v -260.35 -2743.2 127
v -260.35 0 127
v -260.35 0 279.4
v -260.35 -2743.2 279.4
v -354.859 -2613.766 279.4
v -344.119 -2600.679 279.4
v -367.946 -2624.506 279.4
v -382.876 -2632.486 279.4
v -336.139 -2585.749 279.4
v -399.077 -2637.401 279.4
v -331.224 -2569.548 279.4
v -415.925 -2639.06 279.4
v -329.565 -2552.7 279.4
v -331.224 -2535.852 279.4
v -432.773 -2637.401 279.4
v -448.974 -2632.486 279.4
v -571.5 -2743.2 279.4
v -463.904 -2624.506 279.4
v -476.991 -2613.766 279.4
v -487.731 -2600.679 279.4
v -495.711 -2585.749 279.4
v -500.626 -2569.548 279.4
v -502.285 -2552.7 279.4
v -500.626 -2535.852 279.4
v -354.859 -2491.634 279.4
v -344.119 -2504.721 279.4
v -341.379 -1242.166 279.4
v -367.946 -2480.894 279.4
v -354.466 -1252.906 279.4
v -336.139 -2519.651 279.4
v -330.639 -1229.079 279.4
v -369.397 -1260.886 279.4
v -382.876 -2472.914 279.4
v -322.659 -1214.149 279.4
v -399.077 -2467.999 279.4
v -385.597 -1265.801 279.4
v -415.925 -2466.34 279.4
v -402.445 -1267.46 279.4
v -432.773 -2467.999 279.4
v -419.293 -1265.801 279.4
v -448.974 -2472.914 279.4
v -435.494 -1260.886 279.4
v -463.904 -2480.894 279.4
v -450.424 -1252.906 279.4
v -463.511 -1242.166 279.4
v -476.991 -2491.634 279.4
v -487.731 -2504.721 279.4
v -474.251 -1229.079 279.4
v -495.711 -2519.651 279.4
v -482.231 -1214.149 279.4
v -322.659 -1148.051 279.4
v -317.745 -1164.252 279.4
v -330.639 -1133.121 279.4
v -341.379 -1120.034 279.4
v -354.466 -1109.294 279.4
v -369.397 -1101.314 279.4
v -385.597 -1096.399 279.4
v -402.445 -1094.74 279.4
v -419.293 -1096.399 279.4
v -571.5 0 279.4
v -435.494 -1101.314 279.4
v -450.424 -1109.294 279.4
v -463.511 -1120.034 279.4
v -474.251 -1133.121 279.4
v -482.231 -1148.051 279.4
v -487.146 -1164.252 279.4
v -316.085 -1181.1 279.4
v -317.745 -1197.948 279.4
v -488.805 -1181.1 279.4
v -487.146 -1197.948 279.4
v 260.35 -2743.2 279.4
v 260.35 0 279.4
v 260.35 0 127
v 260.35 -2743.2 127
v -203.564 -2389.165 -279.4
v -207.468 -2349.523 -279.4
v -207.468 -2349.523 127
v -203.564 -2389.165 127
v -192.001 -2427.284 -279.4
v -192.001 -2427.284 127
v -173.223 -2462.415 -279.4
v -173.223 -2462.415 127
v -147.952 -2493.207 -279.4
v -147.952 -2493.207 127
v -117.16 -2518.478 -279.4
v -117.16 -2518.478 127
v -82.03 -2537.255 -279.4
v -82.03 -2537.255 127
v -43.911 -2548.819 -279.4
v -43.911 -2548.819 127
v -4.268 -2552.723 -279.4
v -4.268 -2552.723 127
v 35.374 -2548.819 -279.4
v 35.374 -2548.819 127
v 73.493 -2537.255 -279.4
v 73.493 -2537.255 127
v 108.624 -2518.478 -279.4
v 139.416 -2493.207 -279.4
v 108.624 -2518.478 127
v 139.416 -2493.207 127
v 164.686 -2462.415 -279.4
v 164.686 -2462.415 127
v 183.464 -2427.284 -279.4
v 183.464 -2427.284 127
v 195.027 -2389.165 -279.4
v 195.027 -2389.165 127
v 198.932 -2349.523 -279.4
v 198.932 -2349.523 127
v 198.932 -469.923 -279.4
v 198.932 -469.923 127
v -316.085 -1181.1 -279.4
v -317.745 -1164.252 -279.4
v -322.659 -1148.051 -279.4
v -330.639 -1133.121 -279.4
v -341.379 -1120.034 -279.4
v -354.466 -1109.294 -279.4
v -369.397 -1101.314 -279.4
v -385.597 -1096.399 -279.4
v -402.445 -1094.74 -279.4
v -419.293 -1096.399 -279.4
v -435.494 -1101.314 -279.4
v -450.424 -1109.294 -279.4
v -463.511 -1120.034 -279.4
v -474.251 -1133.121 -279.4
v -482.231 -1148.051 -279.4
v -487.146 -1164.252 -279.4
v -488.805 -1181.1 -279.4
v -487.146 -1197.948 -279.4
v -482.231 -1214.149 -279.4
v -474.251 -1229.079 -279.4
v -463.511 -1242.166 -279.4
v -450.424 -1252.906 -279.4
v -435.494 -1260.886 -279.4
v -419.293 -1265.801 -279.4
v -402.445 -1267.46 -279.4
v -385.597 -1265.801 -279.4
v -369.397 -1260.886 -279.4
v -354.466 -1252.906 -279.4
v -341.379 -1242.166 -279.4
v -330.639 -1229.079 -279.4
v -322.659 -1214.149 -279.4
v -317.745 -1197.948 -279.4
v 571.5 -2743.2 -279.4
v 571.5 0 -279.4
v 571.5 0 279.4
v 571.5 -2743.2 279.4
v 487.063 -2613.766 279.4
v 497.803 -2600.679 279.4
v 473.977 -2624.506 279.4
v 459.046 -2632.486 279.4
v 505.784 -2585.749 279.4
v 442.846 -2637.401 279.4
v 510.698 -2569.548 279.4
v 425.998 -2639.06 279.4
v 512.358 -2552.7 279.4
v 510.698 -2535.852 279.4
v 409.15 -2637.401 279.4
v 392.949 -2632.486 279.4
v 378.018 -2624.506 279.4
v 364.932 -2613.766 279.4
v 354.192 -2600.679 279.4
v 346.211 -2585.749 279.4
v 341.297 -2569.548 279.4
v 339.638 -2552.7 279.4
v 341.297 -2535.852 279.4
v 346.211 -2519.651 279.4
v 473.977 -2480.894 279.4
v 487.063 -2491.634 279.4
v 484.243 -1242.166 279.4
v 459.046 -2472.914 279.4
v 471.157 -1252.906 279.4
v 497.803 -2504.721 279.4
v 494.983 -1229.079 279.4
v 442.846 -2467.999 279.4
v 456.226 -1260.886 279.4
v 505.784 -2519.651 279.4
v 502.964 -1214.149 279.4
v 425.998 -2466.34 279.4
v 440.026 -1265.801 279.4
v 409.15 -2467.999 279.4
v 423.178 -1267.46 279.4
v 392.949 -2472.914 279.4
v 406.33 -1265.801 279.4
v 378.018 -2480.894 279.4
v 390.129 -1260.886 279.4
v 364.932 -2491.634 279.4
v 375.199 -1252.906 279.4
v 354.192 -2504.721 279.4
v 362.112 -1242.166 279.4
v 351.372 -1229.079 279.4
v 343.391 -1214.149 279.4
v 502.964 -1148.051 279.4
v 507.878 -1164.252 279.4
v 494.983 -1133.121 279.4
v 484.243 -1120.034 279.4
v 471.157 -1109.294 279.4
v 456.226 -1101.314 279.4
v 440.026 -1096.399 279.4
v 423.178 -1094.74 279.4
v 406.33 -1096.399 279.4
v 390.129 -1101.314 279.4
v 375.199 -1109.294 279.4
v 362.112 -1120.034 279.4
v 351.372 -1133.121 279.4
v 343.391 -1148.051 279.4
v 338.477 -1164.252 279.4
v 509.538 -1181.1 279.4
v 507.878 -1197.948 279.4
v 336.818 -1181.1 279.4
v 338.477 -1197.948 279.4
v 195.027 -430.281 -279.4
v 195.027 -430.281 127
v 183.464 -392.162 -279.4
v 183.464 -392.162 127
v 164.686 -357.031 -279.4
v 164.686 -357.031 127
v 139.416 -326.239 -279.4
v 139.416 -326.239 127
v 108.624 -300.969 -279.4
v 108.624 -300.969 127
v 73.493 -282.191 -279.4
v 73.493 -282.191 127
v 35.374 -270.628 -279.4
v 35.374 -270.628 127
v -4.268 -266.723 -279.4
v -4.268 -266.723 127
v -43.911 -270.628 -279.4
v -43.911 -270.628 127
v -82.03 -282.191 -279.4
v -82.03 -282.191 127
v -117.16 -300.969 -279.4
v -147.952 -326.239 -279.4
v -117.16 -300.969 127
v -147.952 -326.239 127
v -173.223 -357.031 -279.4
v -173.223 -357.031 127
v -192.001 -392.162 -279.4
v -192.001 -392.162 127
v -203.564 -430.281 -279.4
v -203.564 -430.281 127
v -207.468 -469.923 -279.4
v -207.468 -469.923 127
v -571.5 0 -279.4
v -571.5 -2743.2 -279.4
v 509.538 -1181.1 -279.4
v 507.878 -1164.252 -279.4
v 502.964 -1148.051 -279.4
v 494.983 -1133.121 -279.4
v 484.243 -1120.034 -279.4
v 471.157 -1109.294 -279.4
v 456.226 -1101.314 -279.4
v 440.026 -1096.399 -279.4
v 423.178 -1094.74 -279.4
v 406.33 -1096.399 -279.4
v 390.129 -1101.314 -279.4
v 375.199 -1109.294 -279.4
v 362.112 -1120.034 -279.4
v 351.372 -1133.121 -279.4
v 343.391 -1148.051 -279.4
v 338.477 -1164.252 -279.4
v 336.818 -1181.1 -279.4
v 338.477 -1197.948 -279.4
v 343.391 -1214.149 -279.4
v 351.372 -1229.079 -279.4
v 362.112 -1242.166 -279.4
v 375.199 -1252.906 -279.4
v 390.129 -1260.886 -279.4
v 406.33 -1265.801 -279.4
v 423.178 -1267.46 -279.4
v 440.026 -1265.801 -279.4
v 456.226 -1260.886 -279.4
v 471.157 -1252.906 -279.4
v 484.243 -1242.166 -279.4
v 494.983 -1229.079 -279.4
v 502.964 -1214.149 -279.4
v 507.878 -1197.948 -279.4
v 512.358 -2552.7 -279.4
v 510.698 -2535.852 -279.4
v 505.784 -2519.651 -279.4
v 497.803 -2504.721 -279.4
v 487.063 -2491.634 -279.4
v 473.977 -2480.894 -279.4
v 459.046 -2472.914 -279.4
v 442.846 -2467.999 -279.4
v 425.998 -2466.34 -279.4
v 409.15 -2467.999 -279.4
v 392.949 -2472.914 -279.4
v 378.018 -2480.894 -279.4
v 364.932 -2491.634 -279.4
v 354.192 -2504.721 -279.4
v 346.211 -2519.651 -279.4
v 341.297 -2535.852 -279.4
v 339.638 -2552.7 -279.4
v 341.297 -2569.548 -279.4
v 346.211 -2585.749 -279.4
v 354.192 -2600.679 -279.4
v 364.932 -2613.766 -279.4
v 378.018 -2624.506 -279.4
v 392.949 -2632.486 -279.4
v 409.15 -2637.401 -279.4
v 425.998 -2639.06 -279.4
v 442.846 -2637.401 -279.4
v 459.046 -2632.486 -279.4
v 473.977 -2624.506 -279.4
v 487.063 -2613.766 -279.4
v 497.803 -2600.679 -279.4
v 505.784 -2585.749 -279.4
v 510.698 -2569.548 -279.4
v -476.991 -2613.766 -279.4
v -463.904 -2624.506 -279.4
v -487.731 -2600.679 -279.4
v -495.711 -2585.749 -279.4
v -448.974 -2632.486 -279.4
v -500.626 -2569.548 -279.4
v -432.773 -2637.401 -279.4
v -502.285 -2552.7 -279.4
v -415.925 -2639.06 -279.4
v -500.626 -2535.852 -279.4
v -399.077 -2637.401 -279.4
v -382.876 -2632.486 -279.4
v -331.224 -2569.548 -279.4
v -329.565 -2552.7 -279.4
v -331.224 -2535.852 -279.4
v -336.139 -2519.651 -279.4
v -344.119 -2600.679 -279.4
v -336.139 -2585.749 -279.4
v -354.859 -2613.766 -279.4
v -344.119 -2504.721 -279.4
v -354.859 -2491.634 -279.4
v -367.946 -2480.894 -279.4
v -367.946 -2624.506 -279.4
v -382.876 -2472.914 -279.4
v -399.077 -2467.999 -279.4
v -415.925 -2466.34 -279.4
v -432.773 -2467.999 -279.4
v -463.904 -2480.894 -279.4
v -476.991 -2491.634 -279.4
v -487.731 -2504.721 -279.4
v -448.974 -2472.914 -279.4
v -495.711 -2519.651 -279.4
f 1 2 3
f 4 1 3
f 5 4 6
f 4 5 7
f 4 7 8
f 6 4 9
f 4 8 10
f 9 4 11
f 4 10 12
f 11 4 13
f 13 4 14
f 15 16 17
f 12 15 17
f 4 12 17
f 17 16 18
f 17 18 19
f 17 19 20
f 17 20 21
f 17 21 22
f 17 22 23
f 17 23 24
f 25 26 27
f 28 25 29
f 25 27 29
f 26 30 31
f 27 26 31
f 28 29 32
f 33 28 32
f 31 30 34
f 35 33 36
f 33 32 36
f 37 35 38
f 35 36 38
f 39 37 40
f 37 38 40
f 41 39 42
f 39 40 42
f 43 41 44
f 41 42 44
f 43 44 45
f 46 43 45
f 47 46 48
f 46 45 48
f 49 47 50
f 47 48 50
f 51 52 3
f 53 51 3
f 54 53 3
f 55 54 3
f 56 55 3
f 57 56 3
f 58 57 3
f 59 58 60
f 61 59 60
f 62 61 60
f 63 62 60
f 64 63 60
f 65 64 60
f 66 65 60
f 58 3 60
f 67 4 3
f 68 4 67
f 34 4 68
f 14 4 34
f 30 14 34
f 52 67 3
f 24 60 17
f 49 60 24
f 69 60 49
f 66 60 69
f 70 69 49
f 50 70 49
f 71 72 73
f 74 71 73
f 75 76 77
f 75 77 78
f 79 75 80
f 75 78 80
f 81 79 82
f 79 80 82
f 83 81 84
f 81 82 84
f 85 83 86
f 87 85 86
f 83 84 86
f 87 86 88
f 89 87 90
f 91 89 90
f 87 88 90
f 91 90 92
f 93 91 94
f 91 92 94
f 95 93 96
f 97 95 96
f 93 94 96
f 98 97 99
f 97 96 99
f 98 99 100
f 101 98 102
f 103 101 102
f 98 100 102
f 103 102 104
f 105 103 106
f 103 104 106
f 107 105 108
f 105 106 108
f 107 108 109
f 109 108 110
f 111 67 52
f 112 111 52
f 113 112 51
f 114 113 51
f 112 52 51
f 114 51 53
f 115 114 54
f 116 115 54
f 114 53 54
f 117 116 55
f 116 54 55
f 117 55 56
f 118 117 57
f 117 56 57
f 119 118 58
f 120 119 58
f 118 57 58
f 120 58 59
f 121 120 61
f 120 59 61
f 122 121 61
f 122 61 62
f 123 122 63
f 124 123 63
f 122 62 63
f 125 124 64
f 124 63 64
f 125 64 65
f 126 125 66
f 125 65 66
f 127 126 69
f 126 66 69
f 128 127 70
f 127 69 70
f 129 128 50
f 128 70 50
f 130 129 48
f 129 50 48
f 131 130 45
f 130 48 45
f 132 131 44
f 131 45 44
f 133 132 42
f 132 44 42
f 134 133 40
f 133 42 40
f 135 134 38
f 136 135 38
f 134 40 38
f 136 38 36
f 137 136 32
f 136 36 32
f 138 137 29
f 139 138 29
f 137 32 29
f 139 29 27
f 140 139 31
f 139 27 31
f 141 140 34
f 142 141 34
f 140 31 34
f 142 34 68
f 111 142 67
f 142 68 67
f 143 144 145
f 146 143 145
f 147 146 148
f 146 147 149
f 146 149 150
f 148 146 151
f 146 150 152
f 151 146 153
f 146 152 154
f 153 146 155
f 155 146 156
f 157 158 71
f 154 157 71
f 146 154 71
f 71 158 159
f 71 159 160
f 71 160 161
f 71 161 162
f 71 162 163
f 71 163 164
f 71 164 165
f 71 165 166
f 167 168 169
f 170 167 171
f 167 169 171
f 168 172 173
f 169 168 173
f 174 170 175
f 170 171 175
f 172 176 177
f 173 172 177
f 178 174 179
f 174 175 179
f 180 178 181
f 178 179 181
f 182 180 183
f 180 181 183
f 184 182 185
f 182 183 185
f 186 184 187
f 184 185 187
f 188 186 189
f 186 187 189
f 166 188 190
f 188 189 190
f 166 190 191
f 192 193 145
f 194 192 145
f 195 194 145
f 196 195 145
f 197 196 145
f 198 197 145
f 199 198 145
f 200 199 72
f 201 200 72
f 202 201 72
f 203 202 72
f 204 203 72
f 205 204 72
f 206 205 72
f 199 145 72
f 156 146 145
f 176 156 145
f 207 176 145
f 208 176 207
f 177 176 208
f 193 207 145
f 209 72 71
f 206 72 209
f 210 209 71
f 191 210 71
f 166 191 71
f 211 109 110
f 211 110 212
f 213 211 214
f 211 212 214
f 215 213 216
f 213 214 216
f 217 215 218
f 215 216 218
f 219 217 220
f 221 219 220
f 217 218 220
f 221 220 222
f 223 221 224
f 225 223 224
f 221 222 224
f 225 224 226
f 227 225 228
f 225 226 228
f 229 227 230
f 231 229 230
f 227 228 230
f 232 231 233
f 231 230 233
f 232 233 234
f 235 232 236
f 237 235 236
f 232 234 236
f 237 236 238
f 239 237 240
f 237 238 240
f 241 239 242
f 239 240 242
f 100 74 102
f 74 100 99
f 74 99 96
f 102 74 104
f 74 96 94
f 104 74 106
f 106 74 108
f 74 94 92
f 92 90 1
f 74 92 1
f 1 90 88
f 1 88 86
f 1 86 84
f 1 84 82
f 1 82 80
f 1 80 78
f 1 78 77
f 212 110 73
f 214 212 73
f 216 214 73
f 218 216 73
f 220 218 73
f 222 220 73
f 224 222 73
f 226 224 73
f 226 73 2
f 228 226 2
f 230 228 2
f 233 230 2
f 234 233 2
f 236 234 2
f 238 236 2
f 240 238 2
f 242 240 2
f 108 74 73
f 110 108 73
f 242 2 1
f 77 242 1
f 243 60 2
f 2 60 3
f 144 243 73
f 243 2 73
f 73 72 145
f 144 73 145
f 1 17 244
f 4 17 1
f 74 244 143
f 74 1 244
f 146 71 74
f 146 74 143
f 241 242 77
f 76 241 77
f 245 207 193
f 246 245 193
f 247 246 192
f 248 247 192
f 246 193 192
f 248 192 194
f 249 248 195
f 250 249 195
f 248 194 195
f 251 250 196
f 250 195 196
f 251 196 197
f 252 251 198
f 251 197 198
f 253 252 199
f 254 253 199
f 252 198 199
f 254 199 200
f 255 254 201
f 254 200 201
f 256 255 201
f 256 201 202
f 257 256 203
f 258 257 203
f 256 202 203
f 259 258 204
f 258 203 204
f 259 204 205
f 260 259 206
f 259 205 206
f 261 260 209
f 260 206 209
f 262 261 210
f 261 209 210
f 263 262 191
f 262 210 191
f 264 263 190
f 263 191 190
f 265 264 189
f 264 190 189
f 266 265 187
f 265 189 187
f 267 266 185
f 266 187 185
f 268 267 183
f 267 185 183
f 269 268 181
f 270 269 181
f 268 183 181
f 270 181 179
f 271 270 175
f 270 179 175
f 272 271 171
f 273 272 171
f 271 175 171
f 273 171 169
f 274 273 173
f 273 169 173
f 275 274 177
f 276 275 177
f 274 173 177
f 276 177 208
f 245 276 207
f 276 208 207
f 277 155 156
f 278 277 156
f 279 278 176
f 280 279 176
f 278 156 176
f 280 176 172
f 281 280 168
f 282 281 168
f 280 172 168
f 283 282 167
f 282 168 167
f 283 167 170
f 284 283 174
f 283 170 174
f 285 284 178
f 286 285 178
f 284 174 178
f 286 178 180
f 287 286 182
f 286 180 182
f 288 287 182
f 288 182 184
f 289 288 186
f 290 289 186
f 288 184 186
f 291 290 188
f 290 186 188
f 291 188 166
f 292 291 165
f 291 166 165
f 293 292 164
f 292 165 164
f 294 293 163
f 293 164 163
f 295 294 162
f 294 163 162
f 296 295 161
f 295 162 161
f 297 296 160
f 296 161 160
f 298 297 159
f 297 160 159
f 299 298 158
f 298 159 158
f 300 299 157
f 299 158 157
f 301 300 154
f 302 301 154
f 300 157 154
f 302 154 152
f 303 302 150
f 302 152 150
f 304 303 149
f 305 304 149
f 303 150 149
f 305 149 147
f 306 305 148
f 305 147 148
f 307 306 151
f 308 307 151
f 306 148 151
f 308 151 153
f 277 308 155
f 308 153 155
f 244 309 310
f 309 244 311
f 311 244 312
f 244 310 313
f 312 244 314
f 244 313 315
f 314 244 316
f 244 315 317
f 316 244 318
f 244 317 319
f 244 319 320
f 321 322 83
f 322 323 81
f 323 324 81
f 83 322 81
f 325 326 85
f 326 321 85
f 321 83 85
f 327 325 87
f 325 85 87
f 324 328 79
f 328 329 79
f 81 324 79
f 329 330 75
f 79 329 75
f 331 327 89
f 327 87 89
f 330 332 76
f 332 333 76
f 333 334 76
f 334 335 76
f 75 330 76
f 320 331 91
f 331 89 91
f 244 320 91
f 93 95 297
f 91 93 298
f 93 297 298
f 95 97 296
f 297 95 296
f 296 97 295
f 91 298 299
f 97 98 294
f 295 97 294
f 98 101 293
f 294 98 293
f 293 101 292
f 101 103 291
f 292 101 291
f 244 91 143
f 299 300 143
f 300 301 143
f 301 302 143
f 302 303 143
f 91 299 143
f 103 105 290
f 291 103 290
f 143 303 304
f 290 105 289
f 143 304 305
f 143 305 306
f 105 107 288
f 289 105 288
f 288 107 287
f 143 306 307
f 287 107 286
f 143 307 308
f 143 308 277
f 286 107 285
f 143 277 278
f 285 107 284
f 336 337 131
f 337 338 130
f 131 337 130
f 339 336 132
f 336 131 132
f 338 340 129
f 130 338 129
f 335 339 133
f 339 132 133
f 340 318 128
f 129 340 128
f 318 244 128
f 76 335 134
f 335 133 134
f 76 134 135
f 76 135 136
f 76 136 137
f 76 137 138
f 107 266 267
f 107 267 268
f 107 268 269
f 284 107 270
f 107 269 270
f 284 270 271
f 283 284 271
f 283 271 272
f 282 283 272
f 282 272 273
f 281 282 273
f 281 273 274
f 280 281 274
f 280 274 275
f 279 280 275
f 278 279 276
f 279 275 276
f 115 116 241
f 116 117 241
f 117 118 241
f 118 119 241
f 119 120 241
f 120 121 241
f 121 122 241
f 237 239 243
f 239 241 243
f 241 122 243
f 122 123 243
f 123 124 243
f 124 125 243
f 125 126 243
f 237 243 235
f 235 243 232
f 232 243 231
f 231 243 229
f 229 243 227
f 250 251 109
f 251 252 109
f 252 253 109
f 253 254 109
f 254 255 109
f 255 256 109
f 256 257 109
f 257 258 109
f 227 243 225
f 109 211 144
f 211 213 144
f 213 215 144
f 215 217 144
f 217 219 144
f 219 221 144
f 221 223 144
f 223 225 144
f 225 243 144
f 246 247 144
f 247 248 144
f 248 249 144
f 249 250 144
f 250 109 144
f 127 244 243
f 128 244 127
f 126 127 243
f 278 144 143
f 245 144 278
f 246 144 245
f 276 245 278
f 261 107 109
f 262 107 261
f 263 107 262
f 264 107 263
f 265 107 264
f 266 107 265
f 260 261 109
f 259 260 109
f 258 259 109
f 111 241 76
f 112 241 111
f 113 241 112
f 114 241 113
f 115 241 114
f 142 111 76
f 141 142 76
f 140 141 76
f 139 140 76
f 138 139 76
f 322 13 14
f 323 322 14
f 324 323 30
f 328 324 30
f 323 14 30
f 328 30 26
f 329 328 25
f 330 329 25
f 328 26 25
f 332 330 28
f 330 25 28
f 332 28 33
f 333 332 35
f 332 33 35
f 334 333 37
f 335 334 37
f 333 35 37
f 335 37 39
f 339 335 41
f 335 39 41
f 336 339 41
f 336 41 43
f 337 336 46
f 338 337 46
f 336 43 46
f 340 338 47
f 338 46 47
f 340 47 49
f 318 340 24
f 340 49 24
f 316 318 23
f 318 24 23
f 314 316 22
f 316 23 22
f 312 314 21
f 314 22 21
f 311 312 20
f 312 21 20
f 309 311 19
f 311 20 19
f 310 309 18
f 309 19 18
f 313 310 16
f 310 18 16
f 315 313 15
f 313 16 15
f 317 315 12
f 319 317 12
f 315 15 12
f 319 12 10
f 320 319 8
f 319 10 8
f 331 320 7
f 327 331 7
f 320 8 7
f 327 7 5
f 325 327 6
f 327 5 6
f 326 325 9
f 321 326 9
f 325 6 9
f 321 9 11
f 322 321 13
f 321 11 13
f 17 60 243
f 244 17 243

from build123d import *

# Parameters (mm, degrees)
F1_DEPTH = 2743.2
F3_DEPTH = 406.4
F4_R     = 86.36
F5_DEPTH = 558.8


with BuildPart() as f1:
    # F0 (on Front) → F1 (new body)
    with BuildSketch(Plane.XZ):
        Polygon((571.5, -279.4), (571.5, 279.4), (260.35, 279.4), (260.35, 127), (-260.35, 127), (-260.35, 279.4), (-571.5, 279.4), (-571.5, -279.4), align=None)
    extrude(amount=F1_DEPTH)

    # F2 (on face) → F3 (cut)
    with BuildSketch(Plane.XY.offset(127)):
        with BuildLine():
            ThreePointArc((198.931698, -469.923138), (-4.268302, -266.723138), (-207.468302, -469.923138))
            Line((-207.468302, -469.923138), (-207.468302, -2349.523138))
            ThreePointArc((-207.468302, -2349.523138), (-4.268302, -2552.723138), (198.931698, -2349.523138))
            Line((198.931698, -2349.523138), (198.931698, -469.923138))
        make_face()
    extrude(amount=-F3_DEPTH, mode=Mode.SUBTRACT)

    # F4 (on face) → F5 (cut)
    with BuildSketch(Plane.XY.offset(279.4)):
        with Locations((-402.445167, -1181.1)):
            Circle(F4_R)
        with Locations((-415.925, -2552.7)):
            Circle(F4_R)
        with Locations((425.997525, -2552.7)):
            Circle(F4_R)
        with Locations((423.177719, -1181.1)):
            Circle(F4_R)
    extrude(amount=-F5_DEPTH, mode=Mode.SUBTRACT)


solid = f1.part
